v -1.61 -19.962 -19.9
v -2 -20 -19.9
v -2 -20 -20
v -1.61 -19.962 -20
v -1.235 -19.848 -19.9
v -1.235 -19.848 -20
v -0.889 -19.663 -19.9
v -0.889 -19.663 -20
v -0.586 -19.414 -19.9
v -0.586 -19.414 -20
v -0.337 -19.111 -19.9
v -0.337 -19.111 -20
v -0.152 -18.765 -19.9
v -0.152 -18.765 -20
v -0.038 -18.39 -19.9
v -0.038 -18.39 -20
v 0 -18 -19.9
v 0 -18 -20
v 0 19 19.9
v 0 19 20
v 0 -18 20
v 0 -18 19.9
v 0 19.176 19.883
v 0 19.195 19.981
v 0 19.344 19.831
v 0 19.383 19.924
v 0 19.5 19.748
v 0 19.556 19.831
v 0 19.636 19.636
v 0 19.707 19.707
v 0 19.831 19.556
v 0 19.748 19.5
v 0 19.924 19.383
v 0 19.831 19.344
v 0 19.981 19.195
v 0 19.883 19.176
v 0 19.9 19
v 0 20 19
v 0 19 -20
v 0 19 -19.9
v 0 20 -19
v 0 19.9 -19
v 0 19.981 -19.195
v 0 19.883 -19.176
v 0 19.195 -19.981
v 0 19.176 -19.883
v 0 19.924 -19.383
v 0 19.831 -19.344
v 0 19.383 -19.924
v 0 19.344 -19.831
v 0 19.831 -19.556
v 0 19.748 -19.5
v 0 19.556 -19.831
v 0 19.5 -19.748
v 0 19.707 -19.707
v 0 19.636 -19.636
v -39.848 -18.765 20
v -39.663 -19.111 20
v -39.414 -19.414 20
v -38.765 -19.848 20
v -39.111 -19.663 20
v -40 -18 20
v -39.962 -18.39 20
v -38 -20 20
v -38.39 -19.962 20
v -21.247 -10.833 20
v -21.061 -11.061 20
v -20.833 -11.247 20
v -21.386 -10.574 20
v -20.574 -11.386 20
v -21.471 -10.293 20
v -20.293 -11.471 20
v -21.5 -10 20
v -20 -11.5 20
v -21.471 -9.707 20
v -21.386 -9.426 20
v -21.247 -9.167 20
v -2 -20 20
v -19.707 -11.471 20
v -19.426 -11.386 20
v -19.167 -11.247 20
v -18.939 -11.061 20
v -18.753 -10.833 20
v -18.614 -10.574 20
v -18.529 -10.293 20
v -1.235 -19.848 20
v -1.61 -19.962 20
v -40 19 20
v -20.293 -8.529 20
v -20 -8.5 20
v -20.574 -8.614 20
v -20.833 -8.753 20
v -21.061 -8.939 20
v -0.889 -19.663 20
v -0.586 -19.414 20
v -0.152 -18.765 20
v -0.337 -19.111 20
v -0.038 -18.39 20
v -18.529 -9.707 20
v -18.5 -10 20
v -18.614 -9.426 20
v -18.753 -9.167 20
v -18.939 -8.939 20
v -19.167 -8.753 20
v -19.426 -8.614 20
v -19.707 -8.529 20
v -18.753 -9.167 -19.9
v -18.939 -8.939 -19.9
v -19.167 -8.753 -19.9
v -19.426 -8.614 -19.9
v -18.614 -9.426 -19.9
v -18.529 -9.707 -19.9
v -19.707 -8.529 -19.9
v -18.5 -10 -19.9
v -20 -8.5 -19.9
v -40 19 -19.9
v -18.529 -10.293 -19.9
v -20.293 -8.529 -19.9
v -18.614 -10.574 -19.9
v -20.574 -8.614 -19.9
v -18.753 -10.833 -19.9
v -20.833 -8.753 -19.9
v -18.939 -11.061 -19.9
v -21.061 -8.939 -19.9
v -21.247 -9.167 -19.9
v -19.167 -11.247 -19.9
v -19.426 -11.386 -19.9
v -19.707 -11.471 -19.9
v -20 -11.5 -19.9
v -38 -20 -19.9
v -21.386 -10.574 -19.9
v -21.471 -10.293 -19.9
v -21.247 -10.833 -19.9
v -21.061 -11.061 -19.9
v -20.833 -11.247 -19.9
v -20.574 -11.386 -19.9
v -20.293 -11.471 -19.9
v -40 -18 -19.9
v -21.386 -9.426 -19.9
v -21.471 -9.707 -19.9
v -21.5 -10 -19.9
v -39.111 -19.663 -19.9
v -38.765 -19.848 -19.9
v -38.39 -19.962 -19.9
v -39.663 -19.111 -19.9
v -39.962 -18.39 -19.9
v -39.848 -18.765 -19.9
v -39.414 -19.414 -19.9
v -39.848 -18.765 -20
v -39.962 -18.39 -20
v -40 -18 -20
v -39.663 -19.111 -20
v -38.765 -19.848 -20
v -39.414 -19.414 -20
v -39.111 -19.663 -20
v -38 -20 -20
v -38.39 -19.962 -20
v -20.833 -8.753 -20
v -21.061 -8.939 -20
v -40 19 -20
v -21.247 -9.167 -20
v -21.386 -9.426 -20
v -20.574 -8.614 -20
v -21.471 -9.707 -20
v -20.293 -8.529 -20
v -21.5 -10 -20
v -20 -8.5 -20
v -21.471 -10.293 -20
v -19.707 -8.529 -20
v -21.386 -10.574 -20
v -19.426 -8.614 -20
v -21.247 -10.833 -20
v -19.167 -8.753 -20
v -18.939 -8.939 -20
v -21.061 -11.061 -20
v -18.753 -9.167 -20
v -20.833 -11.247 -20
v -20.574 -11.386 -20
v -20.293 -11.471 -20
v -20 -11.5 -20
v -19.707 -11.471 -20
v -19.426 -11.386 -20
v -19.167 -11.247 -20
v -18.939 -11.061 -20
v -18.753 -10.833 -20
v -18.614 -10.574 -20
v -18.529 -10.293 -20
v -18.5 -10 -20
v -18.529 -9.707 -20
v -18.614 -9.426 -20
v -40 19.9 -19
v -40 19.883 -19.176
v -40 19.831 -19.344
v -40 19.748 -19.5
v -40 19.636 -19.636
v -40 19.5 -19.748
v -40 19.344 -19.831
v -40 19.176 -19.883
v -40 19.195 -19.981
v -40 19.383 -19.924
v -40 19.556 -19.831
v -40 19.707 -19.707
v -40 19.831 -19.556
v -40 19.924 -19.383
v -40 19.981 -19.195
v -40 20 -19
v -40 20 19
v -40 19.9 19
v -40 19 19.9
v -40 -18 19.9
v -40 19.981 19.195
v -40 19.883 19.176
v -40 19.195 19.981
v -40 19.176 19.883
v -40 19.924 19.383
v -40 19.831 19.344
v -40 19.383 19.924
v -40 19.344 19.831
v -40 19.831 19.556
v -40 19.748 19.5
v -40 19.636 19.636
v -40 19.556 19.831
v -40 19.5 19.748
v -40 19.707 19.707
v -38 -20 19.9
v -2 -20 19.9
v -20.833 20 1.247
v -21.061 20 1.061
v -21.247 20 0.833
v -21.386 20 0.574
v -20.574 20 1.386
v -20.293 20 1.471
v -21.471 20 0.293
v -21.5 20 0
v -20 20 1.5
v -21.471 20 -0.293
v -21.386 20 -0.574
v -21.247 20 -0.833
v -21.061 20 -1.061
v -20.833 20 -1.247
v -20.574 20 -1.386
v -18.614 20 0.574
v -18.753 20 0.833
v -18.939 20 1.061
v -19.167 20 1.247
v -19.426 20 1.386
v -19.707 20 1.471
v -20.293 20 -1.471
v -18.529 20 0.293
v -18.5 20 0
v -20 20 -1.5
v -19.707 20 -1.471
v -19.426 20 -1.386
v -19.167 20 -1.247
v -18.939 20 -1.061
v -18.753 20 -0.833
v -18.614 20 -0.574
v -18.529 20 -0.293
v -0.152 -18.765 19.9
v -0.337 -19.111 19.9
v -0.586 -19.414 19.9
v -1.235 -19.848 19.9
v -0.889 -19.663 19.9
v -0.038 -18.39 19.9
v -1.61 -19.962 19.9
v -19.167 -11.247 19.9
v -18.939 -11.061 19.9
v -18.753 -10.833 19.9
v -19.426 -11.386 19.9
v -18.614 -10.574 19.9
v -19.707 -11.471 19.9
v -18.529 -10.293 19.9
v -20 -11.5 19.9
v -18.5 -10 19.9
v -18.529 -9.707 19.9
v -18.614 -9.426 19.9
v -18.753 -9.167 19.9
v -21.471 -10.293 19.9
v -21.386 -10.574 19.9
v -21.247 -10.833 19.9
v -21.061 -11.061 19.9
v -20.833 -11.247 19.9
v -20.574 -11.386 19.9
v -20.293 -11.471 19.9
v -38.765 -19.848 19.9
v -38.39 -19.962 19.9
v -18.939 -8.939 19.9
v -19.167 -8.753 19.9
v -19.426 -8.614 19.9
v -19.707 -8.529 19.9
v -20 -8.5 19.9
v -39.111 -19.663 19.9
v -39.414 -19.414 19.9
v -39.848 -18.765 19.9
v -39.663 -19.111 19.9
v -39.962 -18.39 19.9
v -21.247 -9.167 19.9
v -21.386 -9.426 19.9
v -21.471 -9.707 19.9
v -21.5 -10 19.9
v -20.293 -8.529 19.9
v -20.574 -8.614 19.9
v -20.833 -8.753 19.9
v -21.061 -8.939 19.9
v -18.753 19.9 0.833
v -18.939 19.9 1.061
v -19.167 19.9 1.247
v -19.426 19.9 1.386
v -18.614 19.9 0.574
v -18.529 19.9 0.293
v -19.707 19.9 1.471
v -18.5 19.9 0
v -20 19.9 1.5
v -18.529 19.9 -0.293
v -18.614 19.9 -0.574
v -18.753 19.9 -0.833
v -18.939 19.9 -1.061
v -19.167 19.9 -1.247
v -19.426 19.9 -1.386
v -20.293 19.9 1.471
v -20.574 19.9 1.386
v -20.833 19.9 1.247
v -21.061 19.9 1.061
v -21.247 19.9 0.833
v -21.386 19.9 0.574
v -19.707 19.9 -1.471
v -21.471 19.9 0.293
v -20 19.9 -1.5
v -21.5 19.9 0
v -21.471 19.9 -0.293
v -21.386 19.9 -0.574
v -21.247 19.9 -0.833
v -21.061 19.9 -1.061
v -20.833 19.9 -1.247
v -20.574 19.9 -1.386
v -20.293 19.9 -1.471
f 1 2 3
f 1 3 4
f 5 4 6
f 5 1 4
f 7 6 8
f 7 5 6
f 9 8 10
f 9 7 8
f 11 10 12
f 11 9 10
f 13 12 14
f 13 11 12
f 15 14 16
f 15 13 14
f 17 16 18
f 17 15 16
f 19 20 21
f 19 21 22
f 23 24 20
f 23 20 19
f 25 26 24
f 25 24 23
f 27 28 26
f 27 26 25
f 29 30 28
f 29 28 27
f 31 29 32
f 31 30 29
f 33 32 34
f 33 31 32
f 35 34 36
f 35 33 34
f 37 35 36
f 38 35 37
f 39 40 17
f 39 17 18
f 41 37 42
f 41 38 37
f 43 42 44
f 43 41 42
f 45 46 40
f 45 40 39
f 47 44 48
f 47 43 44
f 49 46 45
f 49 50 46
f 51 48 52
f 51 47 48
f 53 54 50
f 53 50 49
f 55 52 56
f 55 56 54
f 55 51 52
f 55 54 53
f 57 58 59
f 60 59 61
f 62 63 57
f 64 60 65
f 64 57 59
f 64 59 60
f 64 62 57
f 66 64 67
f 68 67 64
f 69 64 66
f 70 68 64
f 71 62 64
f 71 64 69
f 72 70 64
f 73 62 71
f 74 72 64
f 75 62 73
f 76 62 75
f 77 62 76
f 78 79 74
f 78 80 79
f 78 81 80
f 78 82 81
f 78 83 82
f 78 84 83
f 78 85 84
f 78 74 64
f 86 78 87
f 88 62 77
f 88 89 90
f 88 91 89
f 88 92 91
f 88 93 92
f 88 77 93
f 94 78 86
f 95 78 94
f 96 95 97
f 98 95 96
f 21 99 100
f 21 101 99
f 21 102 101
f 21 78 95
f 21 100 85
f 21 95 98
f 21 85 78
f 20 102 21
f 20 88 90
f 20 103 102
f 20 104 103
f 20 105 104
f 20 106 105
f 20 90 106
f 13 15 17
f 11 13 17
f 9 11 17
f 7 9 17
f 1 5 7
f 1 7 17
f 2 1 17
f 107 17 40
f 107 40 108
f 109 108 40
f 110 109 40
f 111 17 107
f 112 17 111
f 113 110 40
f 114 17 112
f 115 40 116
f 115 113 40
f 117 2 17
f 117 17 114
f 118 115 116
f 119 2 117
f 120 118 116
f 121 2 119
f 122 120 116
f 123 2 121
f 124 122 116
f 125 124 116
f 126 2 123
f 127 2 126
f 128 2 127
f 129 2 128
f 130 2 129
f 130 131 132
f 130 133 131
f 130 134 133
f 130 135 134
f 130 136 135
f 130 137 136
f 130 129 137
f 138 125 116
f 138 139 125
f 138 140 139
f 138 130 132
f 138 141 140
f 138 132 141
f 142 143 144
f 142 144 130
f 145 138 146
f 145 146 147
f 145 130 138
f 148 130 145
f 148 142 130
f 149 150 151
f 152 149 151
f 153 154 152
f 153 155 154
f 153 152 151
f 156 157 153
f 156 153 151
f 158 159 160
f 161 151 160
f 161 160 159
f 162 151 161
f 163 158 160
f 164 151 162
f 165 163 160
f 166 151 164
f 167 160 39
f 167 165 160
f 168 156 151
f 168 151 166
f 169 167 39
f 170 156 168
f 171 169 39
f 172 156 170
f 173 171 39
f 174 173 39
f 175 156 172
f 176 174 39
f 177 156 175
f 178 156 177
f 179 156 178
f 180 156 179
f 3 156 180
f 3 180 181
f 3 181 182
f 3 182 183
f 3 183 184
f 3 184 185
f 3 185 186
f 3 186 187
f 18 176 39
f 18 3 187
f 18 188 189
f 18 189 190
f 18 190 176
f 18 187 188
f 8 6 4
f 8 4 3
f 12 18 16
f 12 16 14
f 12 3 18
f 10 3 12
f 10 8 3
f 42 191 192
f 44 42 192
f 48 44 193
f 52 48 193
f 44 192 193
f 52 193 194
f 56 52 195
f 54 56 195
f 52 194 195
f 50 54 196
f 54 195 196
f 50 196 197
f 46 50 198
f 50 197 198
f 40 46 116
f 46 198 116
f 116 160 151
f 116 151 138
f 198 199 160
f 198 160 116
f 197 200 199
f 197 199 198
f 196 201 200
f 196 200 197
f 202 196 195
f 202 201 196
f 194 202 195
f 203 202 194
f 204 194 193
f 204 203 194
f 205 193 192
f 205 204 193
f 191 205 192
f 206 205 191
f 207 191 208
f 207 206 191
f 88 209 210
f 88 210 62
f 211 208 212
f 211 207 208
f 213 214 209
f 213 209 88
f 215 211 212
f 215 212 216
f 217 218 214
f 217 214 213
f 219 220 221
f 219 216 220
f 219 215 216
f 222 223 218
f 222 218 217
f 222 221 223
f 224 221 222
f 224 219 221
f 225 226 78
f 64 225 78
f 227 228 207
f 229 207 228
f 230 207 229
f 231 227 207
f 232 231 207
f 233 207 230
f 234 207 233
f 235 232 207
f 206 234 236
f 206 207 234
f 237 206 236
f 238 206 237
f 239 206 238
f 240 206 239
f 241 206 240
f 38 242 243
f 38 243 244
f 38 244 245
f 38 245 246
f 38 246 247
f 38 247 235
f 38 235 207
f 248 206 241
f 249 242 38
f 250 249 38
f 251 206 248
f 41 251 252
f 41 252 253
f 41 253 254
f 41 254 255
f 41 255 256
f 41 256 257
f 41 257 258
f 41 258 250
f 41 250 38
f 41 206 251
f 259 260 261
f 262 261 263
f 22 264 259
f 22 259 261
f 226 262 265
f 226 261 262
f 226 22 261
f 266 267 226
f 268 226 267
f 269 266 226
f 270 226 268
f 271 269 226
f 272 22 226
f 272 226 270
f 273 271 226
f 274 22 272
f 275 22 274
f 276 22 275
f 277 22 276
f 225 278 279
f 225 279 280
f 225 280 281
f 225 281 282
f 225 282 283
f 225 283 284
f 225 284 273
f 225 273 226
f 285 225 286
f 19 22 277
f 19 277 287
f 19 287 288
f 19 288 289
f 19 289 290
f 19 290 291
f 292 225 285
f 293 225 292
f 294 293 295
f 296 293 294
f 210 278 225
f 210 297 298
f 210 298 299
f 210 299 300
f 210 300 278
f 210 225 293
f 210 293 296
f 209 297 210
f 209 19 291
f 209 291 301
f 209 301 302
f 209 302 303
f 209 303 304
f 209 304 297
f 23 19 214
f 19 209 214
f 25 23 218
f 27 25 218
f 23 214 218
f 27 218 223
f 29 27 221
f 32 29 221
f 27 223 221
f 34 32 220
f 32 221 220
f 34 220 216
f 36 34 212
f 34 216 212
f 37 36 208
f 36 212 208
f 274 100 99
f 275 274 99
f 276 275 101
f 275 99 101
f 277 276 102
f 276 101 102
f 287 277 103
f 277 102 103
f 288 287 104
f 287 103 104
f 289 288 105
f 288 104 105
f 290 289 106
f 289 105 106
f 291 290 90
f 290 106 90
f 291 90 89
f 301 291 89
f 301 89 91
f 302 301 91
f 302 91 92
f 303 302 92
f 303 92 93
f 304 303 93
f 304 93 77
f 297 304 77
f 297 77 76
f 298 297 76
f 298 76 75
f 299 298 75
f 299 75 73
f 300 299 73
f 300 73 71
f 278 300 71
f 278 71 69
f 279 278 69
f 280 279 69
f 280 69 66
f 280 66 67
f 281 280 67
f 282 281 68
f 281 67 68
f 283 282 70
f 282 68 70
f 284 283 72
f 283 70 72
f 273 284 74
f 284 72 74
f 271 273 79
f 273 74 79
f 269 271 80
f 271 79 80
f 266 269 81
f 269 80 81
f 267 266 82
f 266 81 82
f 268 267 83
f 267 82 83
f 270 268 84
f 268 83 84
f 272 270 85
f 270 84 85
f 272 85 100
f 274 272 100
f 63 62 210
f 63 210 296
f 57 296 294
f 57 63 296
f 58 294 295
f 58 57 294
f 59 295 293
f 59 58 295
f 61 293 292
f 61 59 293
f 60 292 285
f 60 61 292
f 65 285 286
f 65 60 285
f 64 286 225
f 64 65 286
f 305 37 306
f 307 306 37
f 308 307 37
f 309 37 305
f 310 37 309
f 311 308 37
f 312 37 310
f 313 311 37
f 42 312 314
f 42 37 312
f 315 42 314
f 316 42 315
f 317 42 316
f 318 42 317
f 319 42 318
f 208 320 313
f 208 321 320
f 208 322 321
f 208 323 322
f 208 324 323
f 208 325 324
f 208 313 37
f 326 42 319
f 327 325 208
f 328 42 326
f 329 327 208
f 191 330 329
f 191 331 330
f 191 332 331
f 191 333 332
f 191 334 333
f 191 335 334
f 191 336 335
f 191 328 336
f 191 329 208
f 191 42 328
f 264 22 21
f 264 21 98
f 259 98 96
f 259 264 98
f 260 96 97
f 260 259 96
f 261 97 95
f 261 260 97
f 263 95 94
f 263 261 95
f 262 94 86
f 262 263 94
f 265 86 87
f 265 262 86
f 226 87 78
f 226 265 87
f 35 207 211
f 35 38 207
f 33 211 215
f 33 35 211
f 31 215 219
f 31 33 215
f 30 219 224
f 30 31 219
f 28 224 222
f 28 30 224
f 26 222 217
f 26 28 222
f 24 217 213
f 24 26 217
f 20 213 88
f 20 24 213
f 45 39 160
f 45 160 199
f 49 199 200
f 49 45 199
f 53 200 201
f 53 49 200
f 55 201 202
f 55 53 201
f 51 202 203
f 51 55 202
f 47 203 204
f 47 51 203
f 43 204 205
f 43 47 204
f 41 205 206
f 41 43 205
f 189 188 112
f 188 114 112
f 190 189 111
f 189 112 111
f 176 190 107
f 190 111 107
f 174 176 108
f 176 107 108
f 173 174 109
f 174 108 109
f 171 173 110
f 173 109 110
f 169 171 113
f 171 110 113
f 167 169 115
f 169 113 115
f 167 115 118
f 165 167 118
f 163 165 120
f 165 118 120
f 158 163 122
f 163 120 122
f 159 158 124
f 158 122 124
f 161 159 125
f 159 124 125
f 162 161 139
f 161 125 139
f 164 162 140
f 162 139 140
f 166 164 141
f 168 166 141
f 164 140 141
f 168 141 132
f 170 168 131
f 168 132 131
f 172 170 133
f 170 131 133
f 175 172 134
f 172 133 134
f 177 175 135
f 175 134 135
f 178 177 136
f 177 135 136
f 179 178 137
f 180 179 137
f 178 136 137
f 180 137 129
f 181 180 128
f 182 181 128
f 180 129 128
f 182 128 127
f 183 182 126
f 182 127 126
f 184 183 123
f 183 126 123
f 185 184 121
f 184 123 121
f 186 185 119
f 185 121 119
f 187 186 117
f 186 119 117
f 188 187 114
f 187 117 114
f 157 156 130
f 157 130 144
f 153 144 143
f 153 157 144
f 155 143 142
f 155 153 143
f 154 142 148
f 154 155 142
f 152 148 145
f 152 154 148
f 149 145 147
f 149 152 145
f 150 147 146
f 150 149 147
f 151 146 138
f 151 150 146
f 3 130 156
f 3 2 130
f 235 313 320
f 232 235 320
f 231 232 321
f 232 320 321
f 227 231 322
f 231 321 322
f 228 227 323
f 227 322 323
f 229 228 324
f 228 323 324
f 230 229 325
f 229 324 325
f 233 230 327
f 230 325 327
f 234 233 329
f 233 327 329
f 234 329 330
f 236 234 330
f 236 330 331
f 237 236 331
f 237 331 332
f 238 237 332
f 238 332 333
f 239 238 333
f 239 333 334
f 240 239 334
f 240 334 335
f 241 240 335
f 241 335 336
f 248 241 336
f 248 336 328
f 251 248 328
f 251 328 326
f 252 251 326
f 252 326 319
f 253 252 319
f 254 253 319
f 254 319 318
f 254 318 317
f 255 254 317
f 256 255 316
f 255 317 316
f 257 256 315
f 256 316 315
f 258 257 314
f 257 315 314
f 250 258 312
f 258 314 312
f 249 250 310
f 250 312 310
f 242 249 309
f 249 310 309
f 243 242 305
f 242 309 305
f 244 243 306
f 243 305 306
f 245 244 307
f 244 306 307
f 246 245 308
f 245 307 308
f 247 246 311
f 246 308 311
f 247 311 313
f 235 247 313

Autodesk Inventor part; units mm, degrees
ref_plane "YZ Plane" through (0, 0, 0) normal (1, 0, 0) x (0, 1, 0)
ref_plane "XY Plane" through (0, 0, 0) normal (0, 0, 1) x (1, 0, 0)
sketch "Sketch1" plane through (0, 0, 0) normal (1, 0, 0) x (0, 1, 0)
  line L0 (20, 20) -> (-20, 20) construction
  line L1 (-20, 20) -> (-20, -20) construction
  line L2 (-20, -20) -> (20, -20) construction
  line L3 (20, -20) -> (20, 20) construction
  line L4 (20, 20) -> (-20, -20) construction
  line L5 (-20, 20) -> (20, -20) construction
  line L6 (-20, 20) -> (19, 20)
  arc A0 (20, 19) -> (19, 20) centre (19, 19) ccw
  line L7 (-20, -20) -> (19, -20)
  arc A1 (19, -20) -> (20, -19) centre (19, -19) ccw
  line L8 (20, -19) -> (20, 19)
  point P0 (0, 0)
  dimension "d0" = 40
  dimension "d1" = 40
  dimension "d2" = 39
  dimension "d3" = 39
ref_plane "Work Plane1" through (0, -20, 20) normal (0, 1, 0) x (-1, 0, 0)
sketch "Sketch2" plane through (0, -20, 20) normal (0, 1, 0) x (-1, 0, 0)
  line L0 (0, 0) -> (40, 0)
  line L1 (40, 0) -> (40, -0.1)
  line L2 (40, -0.1) -> (0, -0.1)
  line L3 (0, -0.1) -> (0, 0)
  point P0 (0, -20)
  dimension "d4" = 40
  dimension "d5" = 0.1
sweep "Sweep1" add profiles "Sketch2" path "Sketch1"
fillet "Fillet1" radius 2 4 edges at (0, -20, 19.95) (0, -20, -19.95) (-40, -20, 19.95) (-40, -20, -19.95)
sketch "Sketch3" plane through (-40, 19, 20) normal (0, 0, 1) x (1, 0, 0)
  circle A0 centre (20, -29) radius 1.5
  line L0 (0, 0) -> (0, -37) construction
  line L1 (0, -29) -> (40, -29) construction
  line L2 (40, 0) -> (40, -37) construction
  line L3 (38, -39) -> (2, -39) construction
  point P0 (40, -19)
  dimension "d9" = 3
  dimension "d10" = 10
  dimension "d11" = 20
extrude "Extrusion1" cut sketch "Sketch3" against normal through all
surface extrude "ExtrusionSrf1" sketch "Sketch3" against normal through all shown yes curves A0
sketch "Sketch4" plane through (-40, 20, 19) normal (0, 1, 0) x (1, 0, 0)
  line L0 (0, 0) -> (40, 0) construction
  line L1 (0, 38) -> (40, 38) construction
  line L2 (0, 0) -> (40, 38) construction
  line L3 (40, 0) -> (40, 38) construction
  line L4 (40, 0) -> (0, 38) construction
  point P0 (40, 19)
  point P1 (20, 19)
hole "Hole1" at (-20, 20, 0) direction (0, -1, 0) diameter 3 end through all
equation "\"d3\" = d2"
properties material "Iron, Malleable"
